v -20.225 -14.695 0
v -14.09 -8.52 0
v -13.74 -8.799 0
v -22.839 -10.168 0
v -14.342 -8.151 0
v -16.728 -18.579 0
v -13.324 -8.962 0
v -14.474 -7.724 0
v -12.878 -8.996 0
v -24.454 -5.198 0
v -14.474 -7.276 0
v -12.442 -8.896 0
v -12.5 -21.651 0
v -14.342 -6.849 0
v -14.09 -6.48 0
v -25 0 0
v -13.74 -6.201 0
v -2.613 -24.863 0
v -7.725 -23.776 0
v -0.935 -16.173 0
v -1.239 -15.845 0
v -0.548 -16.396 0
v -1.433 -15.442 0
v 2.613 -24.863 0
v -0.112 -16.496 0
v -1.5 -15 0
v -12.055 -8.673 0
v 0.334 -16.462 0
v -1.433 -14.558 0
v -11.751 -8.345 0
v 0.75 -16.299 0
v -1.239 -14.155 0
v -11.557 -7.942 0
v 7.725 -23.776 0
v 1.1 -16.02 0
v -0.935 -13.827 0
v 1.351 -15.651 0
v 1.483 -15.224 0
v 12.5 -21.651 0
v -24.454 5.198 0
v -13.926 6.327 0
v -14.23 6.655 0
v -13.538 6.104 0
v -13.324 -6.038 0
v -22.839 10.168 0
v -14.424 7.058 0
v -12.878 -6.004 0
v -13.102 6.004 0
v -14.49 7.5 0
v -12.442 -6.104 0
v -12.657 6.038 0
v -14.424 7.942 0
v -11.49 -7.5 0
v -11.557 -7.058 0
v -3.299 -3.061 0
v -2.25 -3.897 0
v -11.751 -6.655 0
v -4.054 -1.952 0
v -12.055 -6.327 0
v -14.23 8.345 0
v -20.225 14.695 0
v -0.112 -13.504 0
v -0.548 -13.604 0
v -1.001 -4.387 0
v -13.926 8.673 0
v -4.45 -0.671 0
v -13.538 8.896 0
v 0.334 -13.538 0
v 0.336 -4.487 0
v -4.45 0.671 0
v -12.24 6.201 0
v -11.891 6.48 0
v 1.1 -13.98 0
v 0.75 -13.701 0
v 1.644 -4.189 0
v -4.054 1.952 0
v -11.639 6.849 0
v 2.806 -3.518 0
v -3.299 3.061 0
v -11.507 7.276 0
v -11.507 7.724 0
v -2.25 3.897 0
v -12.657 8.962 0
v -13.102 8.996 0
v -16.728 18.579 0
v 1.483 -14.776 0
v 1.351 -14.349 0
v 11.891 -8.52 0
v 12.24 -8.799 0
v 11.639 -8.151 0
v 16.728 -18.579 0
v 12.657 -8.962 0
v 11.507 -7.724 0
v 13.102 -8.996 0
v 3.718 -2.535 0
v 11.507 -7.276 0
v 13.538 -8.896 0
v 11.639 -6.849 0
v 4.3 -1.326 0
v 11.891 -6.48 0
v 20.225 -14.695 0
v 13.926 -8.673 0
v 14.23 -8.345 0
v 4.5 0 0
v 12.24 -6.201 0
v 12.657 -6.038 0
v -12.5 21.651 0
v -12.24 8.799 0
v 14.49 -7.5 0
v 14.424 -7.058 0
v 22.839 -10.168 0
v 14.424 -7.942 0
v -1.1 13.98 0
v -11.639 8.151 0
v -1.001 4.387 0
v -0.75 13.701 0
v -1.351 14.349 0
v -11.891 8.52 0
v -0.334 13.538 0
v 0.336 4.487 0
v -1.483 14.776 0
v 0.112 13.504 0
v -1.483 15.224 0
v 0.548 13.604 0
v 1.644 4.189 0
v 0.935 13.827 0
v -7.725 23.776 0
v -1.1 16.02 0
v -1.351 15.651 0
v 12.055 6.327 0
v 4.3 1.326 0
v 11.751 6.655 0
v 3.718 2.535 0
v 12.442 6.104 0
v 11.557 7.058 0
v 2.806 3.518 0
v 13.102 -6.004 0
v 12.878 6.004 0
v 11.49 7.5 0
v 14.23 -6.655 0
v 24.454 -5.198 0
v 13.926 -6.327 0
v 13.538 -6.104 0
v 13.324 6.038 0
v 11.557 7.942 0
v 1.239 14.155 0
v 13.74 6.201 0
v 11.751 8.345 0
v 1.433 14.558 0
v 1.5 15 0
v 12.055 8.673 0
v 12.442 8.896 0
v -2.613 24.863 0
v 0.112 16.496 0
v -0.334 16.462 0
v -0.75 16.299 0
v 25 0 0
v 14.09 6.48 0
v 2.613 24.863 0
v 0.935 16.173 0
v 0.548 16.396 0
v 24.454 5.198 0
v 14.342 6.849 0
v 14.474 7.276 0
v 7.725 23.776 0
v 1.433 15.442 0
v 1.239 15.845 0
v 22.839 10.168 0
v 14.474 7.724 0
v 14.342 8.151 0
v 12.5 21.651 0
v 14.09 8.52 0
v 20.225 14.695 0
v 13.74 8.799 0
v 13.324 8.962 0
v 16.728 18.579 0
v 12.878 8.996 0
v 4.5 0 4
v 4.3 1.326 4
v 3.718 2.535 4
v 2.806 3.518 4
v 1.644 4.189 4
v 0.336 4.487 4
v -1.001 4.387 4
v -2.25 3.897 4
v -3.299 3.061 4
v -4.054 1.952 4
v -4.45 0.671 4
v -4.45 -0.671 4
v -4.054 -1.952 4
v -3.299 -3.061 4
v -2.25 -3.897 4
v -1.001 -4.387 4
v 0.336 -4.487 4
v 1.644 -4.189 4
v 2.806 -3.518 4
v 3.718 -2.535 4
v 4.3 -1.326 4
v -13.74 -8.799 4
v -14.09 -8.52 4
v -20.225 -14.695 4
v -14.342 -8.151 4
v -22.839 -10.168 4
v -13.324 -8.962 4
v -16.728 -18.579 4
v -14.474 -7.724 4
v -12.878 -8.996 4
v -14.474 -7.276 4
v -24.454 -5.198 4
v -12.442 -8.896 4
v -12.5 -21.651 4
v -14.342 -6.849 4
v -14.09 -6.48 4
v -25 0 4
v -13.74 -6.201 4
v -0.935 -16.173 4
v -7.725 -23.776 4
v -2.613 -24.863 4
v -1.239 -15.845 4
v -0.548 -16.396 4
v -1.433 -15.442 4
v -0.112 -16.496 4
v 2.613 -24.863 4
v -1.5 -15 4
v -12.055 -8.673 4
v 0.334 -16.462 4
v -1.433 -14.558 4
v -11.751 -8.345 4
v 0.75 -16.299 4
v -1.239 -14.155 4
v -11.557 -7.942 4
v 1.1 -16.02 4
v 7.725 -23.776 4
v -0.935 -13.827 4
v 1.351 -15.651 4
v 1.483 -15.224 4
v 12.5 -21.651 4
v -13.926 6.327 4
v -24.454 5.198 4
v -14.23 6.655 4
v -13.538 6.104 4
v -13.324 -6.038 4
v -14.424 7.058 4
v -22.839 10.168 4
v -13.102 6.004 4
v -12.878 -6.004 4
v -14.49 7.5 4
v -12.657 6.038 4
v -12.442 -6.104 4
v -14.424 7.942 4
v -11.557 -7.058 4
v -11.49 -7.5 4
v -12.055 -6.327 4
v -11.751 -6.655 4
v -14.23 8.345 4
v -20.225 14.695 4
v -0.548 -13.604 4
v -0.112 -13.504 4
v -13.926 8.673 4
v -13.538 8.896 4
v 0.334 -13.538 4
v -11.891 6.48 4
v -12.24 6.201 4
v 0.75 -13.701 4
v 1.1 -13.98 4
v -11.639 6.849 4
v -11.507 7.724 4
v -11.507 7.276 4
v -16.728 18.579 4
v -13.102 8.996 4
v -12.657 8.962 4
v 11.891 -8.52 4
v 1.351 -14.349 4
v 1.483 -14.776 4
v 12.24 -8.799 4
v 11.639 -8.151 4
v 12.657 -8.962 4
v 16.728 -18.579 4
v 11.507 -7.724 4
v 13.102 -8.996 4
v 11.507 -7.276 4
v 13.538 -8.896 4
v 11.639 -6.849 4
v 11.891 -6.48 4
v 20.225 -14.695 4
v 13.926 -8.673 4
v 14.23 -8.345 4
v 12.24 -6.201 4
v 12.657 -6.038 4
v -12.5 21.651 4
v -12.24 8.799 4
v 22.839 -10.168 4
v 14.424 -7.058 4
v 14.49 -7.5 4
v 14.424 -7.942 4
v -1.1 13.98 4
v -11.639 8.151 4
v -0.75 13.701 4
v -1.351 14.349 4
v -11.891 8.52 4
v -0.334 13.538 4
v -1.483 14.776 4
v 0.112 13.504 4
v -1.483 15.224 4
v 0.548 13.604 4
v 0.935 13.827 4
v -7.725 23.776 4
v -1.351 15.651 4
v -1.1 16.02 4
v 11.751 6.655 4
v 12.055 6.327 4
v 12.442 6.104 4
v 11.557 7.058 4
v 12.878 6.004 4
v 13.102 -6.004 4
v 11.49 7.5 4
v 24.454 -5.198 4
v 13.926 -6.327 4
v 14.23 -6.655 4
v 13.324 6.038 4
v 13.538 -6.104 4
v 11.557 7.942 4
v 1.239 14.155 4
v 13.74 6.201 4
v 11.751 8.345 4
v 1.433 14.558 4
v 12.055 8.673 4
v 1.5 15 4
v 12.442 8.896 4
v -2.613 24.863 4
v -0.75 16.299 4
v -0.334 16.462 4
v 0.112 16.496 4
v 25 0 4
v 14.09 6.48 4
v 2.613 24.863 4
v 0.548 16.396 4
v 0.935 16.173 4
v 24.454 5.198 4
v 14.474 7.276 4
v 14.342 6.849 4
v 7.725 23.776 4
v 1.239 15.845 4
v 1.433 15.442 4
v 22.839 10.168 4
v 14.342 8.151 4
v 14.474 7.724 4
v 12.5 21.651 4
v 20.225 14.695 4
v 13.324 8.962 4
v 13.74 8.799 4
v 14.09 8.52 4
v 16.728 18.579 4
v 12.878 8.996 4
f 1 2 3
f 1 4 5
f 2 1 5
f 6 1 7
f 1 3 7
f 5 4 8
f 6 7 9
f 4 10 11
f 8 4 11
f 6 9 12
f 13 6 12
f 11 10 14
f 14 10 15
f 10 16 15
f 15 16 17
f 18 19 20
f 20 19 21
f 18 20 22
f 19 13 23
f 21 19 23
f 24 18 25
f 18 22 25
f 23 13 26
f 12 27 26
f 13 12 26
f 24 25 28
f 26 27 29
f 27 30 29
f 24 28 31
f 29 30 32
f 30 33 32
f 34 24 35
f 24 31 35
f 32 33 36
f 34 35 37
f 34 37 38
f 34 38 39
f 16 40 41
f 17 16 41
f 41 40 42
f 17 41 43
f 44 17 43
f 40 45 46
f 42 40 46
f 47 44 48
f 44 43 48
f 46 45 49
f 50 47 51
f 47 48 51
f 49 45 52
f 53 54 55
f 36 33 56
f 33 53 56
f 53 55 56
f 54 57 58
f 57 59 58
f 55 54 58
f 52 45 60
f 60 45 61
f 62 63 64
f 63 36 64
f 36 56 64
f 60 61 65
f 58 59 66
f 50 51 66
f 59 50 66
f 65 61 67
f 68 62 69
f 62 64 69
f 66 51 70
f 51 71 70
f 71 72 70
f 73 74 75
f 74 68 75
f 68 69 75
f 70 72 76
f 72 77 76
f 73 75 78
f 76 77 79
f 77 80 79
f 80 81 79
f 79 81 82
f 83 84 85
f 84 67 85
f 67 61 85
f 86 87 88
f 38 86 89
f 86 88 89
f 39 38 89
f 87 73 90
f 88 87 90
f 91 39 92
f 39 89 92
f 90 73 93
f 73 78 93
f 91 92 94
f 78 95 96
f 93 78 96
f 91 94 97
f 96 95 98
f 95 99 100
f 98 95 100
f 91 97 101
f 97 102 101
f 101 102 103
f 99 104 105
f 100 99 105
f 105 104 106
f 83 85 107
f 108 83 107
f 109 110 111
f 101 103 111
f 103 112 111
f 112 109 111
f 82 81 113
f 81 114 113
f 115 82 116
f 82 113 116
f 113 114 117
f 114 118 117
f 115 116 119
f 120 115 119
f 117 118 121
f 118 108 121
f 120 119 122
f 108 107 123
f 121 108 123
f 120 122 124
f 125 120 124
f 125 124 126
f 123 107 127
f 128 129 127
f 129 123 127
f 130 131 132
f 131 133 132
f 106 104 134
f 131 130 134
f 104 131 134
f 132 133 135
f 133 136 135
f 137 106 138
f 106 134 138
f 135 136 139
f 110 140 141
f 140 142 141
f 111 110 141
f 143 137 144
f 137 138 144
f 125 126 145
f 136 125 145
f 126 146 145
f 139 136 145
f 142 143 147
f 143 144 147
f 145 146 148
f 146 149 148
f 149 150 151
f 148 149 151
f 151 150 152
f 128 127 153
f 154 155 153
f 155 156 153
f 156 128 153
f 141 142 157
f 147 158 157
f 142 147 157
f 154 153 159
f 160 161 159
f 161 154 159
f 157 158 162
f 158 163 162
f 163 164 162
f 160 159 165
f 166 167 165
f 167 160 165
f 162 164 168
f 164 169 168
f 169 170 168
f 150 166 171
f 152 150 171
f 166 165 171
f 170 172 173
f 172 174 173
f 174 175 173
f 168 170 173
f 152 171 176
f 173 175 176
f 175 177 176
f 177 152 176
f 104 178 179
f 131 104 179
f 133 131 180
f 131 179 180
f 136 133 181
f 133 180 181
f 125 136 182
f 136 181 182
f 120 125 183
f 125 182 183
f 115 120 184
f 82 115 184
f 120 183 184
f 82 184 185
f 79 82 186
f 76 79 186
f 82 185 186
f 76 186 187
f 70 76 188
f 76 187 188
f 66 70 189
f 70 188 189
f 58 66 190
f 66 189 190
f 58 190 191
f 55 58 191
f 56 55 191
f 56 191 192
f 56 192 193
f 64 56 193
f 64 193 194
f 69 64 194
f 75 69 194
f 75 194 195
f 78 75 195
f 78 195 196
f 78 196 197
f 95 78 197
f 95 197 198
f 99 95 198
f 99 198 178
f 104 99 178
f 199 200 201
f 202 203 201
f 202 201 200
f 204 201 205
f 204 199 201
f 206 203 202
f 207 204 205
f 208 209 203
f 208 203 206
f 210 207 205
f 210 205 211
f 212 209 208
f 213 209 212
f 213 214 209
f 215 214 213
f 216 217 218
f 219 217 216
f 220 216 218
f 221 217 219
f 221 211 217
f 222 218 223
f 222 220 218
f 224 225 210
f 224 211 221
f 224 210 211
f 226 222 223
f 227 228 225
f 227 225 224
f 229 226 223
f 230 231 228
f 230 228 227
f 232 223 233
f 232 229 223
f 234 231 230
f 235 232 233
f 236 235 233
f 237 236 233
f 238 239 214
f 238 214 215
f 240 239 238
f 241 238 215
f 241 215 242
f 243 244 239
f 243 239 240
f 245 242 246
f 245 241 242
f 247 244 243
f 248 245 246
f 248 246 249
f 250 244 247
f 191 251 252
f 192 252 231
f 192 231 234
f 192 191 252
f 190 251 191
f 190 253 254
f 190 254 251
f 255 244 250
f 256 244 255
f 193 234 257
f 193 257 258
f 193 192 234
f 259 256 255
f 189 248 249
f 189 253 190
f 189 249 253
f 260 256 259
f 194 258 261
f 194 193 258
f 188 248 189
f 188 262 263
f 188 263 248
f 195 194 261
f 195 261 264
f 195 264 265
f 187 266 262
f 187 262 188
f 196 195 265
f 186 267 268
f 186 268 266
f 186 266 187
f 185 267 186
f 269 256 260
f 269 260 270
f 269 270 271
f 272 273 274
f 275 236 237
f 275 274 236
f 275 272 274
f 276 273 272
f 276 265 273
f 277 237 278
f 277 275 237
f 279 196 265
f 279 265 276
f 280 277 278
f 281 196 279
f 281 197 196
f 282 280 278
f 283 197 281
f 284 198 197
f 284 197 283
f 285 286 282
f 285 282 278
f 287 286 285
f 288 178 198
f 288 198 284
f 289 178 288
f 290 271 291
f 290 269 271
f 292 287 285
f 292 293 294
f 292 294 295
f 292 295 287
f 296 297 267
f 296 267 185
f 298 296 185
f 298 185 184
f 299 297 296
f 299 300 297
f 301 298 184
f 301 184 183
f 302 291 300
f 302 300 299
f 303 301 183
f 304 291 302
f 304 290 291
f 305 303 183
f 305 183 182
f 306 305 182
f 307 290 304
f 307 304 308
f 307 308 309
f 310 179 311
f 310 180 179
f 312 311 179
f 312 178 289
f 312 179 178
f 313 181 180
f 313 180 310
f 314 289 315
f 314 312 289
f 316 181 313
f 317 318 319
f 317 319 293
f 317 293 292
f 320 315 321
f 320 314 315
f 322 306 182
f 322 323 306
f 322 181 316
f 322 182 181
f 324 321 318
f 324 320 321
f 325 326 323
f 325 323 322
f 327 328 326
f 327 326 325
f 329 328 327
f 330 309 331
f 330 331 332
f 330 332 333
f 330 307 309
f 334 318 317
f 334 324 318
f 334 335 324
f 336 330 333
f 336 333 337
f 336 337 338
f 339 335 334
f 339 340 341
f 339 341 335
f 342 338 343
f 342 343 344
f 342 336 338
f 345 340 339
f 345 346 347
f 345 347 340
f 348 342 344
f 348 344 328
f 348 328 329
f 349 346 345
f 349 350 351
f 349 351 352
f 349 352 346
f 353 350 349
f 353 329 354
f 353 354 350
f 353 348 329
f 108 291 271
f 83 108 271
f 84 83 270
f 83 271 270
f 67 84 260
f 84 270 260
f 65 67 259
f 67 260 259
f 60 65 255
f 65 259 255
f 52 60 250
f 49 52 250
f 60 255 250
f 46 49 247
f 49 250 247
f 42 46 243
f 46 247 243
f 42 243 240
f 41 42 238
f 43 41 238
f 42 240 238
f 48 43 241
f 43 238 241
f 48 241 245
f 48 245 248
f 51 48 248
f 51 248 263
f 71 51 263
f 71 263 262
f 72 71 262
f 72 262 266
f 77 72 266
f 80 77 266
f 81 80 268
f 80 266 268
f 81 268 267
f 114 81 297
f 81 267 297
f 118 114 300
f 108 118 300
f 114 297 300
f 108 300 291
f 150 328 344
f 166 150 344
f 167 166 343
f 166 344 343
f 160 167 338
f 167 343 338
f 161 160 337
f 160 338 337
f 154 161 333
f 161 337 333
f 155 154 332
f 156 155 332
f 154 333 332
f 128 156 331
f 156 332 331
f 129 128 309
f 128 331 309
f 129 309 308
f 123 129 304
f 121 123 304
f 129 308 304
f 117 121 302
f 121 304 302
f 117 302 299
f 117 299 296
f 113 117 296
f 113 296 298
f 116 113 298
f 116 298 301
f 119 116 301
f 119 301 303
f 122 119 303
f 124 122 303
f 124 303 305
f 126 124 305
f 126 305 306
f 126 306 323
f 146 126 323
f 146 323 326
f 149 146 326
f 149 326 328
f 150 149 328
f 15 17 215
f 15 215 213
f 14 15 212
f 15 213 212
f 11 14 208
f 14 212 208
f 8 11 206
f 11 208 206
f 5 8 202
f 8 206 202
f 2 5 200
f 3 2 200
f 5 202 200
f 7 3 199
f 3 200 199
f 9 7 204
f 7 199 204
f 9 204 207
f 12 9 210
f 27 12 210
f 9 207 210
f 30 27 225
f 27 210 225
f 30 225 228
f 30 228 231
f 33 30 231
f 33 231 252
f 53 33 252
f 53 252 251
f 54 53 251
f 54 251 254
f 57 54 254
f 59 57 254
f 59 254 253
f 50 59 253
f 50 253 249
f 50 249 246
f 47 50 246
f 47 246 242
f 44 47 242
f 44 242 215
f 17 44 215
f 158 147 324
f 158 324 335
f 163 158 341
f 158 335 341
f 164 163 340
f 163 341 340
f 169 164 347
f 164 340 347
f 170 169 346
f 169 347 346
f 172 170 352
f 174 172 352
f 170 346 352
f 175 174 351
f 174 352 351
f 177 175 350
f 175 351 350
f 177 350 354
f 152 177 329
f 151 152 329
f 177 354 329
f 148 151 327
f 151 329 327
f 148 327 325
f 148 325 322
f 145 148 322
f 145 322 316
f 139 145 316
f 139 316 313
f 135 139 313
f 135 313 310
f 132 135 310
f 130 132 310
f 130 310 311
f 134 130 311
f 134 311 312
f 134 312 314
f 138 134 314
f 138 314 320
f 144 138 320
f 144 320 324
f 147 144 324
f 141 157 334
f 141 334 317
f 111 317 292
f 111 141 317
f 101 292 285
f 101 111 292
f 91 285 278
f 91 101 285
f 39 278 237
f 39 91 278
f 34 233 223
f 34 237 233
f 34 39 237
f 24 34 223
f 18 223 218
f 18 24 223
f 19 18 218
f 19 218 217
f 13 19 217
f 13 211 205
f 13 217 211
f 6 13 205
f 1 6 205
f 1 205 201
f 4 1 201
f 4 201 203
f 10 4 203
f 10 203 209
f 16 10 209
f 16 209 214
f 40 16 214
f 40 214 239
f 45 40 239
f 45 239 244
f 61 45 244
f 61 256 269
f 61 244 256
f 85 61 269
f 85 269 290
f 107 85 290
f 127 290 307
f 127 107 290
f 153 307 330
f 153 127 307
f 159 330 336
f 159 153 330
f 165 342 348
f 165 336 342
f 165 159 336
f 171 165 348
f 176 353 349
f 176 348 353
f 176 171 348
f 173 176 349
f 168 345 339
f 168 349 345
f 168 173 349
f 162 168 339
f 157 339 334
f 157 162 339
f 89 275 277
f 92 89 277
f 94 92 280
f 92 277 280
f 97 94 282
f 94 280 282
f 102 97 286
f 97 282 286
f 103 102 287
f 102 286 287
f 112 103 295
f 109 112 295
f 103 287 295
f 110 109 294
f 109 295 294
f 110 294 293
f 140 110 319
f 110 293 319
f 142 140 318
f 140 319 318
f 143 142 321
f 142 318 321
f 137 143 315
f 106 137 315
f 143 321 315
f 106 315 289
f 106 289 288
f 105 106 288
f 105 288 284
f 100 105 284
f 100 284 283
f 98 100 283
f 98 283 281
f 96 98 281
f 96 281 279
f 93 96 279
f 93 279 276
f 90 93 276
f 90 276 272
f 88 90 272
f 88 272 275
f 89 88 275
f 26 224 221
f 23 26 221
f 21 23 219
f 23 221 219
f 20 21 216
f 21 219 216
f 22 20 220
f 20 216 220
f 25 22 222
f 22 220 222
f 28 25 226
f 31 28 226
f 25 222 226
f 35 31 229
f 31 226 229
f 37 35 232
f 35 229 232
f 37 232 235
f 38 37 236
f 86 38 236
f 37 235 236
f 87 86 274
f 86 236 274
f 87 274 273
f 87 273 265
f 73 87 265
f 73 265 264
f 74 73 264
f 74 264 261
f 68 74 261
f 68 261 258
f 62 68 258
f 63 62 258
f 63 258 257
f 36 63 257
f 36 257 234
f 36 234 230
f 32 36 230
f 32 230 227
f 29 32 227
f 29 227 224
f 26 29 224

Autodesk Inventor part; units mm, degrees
ref_plane "YZ Plane" through (0, 0, 0) normal (1, 0, 0) x (0, 1, 0)
ref_plane "XZ Plane" through (0, 0, 0) normal (0, 1, 0) x (-1, 0, 0)
ref_plane "XY Plane" through (0, 0, 0) normal (0, 0, 1) x (1, 0, 0)
sketch "Sketch1" plane through (0, 0, 0) normal (0, 0, 1) x (1, 0, 0)
  circle A0 centre (0, 0) radius 25
  dimension "d0" = 50
extrude "Extrusion1" add sketch "Sketch1" along normal blind 4
sketch "Sketch2" plane through (0, 0, 4) normal (0, 0, 1) x (1, 0, 0)
  circle A0 centre (0, 15) radius 1.5
  line L0 (0, -35) -> (0, 35) projected
  point P0 (0, 0)
  dimension "d3" = 3
  dimension "d4" = 15
extrude "Extrusion2" cut sketch "Sketch2" against normal blind 10
pattern_circular "Circular Pattern1" count 6 over 360 about axis through (0, 0, -10) along (0, 0, 1) of "Extrusion2"
sketch "Sketch3" plane through (0, 0, 4) normal (0, 0, 1) x (1, 0, 0)
  circle A0 centre (0, 0) radius 4.5
  dimension "d11" = 9
extrude "Extrusion3" cut sketch "Sketch3" against normal blind 10
properties part number "center_cover2"
